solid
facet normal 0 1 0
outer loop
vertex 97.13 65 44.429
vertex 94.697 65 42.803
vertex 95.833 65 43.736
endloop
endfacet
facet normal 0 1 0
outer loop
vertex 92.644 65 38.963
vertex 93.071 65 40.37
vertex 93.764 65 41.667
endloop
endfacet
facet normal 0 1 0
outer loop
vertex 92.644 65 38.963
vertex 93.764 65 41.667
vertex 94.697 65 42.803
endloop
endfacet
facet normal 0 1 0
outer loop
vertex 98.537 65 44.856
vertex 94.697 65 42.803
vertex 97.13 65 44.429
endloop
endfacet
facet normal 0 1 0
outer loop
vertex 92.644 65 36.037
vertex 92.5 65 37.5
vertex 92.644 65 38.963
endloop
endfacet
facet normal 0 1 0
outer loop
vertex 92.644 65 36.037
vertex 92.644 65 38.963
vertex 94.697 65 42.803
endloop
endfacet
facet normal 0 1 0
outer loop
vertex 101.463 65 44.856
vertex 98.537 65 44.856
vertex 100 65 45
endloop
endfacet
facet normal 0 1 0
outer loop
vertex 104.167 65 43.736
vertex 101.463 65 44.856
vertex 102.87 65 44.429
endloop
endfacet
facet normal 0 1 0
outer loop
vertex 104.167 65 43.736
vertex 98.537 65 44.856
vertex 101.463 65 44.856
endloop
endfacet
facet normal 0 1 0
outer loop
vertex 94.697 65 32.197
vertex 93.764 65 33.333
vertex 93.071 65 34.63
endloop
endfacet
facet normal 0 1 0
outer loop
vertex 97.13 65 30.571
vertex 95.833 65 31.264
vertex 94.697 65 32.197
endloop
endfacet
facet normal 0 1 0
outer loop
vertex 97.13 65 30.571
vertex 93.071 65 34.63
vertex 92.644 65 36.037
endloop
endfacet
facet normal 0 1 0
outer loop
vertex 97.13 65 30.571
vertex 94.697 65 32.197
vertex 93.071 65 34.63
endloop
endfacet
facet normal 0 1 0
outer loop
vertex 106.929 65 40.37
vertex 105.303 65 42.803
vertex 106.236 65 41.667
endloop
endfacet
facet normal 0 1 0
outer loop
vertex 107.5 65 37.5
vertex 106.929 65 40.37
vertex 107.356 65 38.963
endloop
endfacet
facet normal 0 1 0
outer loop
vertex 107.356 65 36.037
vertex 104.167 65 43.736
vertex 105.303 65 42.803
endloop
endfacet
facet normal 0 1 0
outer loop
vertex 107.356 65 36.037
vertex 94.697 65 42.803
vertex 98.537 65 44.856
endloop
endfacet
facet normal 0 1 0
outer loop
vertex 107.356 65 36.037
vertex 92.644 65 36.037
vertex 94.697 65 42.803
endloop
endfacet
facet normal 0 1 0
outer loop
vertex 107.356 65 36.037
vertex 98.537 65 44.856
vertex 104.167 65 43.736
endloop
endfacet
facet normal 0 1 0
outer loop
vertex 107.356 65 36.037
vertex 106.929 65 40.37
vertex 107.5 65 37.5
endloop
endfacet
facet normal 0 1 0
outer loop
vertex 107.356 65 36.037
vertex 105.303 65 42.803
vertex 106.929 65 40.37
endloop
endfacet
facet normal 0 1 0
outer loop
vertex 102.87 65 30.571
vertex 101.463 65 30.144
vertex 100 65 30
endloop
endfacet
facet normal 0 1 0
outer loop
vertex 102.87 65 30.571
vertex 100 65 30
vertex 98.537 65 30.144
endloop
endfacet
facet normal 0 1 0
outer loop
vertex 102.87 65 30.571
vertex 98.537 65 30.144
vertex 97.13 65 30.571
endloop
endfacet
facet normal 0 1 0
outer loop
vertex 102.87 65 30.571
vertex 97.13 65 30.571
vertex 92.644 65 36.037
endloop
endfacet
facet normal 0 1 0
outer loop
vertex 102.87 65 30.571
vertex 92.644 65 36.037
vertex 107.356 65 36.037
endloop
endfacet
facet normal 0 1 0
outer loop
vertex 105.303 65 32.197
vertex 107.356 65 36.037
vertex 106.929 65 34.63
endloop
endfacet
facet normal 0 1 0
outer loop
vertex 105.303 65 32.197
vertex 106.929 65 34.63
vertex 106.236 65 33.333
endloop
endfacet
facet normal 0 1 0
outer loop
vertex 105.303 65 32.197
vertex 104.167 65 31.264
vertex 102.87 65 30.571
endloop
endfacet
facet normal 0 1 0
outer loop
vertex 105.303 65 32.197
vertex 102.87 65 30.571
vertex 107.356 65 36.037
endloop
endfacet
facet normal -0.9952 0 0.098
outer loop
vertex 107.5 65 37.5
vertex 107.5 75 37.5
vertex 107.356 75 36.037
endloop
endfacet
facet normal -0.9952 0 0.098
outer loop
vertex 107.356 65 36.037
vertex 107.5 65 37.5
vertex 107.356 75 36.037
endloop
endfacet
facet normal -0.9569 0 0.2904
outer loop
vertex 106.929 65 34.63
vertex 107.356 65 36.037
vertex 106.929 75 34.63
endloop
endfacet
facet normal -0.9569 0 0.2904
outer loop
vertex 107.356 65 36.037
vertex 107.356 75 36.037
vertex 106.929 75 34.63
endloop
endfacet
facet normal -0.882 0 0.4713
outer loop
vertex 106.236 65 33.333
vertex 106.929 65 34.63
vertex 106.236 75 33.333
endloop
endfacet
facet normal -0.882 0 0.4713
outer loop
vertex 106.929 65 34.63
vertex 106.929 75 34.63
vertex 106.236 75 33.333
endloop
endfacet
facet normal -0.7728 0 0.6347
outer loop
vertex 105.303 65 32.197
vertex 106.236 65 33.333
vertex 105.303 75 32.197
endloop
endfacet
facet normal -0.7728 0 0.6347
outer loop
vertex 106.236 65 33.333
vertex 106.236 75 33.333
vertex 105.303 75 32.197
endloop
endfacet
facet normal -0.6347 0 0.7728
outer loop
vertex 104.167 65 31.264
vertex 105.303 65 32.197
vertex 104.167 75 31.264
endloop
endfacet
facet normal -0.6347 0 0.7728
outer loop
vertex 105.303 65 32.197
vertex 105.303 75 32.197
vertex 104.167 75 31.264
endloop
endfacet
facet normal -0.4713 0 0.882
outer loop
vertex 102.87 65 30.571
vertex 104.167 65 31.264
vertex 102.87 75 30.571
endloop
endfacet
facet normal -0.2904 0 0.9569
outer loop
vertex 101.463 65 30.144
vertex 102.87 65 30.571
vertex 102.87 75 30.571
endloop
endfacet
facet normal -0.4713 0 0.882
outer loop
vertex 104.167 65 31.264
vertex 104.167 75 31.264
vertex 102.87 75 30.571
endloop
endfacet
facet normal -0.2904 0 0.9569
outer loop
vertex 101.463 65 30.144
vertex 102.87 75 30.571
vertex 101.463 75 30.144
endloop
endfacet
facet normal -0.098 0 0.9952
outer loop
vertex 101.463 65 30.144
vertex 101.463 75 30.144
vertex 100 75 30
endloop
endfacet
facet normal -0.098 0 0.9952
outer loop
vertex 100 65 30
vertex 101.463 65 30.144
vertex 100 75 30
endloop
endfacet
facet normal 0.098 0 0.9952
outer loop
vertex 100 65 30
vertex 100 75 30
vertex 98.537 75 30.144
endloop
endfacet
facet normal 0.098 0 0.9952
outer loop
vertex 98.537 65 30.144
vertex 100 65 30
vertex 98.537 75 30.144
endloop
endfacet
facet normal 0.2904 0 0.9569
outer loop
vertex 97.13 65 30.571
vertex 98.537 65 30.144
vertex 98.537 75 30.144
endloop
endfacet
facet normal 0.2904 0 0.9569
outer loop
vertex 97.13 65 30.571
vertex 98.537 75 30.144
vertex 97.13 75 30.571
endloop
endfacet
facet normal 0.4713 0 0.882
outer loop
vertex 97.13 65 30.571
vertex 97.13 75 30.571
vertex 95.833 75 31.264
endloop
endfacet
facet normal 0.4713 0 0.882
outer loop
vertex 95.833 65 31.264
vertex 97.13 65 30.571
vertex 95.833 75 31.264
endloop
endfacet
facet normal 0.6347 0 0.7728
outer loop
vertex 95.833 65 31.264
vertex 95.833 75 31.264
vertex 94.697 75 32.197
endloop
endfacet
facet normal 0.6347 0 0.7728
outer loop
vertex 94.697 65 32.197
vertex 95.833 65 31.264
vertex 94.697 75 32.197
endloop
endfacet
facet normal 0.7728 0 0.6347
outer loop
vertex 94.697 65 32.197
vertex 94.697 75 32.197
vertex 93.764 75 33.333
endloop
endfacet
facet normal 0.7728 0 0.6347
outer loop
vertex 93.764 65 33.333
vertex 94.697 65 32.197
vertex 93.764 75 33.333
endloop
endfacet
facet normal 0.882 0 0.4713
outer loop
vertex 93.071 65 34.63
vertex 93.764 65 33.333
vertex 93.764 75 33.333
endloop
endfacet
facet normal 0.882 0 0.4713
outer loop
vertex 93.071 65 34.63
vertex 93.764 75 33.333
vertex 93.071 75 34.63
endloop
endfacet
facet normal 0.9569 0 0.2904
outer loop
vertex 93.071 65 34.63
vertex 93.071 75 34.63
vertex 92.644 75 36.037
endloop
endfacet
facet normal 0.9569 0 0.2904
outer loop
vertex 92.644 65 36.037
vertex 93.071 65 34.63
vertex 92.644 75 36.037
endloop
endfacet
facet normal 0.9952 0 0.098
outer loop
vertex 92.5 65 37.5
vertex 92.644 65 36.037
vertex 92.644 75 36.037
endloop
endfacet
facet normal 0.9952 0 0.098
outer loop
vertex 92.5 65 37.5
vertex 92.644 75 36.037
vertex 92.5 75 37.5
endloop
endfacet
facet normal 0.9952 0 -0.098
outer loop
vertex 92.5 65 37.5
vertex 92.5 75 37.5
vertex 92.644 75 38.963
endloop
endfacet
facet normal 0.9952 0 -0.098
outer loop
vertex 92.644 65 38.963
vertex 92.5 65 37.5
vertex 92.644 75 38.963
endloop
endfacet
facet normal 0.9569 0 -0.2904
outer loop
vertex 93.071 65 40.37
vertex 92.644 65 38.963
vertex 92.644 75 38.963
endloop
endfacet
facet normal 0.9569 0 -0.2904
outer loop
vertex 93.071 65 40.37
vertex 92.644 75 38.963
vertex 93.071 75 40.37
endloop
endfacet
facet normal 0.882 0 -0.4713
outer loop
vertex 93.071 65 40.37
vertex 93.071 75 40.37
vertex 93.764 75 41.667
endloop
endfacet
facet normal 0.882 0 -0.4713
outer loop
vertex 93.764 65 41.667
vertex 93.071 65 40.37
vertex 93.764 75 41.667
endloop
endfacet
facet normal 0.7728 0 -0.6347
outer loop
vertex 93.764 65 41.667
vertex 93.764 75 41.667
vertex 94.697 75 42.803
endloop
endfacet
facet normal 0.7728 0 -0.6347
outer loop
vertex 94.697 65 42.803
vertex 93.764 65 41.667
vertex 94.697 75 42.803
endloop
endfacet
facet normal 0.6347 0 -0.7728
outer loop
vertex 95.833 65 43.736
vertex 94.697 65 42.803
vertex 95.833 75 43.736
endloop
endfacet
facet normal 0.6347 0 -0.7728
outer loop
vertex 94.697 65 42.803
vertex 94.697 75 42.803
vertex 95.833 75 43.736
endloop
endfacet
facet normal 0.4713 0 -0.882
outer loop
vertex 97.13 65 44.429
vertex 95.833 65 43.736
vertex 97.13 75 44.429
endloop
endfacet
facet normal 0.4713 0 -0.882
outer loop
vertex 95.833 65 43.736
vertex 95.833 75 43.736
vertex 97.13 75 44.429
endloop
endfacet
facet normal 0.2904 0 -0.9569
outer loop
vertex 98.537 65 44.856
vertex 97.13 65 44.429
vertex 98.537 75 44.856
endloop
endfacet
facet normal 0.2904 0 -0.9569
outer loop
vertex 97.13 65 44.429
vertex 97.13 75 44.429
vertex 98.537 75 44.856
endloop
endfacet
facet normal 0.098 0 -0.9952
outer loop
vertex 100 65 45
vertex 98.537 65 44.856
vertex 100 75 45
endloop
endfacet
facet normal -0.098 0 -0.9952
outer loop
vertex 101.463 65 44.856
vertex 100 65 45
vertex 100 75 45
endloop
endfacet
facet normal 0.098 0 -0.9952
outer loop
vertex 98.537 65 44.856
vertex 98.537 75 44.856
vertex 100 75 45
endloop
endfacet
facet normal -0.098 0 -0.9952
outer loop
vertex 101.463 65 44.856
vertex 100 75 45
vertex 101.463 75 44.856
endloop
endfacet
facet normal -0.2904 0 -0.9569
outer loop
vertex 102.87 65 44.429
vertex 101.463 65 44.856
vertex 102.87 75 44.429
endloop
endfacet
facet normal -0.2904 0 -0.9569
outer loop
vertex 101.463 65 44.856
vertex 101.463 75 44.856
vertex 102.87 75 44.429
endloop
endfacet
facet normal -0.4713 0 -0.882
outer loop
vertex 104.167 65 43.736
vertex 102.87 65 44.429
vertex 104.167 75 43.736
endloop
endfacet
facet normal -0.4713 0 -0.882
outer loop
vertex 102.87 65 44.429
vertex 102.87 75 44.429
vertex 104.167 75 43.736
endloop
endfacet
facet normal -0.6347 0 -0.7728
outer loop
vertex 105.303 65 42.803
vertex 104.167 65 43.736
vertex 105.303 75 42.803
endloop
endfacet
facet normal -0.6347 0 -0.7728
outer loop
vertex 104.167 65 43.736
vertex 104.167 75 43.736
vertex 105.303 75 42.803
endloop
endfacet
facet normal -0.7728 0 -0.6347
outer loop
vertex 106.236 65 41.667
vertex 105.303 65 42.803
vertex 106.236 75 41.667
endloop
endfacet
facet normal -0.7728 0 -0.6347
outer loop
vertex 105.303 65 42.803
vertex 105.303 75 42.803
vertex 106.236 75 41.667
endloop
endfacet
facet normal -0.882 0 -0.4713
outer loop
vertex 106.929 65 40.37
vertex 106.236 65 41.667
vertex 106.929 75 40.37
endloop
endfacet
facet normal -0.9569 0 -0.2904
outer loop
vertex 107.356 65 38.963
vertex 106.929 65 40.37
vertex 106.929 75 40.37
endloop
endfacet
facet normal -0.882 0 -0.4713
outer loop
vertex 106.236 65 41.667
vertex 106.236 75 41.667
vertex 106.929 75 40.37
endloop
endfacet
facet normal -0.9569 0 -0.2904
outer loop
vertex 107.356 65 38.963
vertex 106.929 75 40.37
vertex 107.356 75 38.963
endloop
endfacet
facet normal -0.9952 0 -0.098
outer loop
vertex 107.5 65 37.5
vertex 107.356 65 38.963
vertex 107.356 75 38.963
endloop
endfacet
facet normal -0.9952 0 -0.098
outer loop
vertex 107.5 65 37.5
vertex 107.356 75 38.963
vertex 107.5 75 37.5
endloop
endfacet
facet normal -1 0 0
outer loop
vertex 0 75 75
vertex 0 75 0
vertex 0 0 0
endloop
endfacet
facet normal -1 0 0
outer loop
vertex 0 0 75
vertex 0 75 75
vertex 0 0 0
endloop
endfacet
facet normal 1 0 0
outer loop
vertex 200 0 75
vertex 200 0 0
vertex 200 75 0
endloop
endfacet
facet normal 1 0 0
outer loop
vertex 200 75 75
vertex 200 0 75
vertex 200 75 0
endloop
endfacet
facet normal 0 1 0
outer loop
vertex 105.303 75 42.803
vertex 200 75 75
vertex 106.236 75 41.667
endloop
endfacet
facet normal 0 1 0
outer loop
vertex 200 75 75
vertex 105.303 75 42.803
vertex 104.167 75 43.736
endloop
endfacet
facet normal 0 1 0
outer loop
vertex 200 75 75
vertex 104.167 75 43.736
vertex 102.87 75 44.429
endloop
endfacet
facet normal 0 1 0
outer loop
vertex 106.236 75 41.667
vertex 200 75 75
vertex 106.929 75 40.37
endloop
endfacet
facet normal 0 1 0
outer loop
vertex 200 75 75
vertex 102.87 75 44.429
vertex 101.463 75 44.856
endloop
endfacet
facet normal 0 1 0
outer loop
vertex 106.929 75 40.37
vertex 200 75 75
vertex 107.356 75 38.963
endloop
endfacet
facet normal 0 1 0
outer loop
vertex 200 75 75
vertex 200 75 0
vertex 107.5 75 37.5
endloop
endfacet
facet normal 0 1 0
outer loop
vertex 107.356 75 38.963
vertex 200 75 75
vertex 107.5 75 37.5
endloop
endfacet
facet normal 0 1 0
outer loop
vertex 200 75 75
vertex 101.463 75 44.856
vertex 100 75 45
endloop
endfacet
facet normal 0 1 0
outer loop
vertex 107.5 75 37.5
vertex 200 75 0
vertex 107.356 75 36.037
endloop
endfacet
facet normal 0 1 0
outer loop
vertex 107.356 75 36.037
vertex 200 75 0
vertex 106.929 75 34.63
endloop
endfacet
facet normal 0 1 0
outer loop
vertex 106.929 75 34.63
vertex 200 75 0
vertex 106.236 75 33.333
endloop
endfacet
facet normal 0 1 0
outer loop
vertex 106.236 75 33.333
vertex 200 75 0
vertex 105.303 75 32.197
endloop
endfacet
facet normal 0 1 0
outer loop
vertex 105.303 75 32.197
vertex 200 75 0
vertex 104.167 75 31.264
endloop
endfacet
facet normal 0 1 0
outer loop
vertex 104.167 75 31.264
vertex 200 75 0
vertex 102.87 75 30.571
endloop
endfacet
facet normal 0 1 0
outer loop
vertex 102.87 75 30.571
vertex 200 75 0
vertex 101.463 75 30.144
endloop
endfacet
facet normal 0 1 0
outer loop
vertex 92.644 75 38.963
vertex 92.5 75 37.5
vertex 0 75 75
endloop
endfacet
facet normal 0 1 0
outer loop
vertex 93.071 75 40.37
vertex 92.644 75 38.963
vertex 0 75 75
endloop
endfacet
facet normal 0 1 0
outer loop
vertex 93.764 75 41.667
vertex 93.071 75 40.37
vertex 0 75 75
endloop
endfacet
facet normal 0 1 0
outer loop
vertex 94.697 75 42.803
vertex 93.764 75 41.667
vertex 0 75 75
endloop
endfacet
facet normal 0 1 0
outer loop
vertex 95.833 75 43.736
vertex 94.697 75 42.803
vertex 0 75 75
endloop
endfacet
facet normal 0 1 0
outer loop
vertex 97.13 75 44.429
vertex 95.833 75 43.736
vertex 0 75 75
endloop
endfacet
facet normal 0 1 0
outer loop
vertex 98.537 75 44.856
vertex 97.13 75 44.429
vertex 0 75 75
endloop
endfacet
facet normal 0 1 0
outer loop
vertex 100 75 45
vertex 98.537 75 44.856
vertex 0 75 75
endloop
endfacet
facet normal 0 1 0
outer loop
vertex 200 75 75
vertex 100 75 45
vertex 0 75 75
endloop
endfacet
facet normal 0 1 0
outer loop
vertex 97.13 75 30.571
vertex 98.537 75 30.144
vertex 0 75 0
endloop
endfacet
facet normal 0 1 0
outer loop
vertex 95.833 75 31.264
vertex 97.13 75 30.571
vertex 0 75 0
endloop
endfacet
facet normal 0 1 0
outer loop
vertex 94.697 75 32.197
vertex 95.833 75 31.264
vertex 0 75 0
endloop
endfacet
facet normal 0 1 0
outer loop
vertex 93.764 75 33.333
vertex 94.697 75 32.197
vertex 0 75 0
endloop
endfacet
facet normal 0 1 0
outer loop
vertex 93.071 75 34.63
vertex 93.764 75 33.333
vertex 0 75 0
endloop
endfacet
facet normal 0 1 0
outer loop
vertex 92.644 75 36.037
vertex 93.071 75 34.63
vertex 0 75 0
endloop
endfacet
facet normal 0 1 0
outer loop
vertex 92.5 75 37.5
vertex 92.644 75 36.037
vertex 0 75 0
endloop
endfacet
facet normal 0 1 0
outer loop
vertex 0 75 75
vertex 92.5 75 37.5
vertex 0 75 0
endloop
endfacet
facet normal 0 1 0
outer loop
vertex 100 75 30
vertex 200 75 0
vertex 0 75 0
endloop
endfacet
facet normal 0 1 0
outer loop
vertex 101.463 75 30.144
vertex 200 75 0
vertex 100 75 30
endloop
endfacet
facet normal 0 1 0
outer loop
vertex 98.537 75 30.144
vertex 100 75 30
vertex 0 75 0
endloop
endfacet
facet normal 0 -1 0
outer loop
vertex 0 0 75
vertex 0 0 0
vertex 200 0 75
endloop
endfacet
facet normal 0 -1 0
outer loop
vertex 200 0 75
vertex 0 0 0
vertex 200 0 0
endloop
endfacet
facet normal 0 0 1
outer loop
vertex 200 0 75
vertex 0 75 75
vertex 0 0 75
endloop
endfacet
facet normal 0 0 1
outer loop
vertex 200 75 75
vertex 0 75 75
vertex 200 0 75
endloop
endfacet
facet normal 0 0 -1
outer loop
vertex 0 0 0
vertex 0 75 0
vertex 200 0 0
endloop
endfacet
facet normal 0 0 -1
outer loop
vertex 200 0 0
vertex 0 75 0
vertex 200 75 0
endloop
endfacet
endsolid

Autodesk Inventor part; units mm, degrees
ref_plane "YZ Plane" through (0, 0, 0) normal (1, 0, 0) x (0, 1, 0)
ref_plane "XZ Plane" through (0, 0, 0) normal (0, 1, 0) x (-1, 0, 0)
ref_plane "XY Plane" through (0, 0, 0) normal (0, 0, 1) x (1, 0, 0)
sketch "Sketch1" plane through (0, 0, 0) normal (0, 0, 1) x (1, 0, 0)
  line L0 (0, 0) -> (200, 0)
  line L1 (200, 0) -> (200, 75)
  line L2 (200, 75) -> (0, 75)
  line L3 (0, 75) -> (0, 0)
  dimension "d0" = 200
  dimension "d1" = 75
extrude "Extrusion1" add sketch "Sketch1" along normal blind 75
sketch "Sketch2" plane through (0, 75, 0) normal (0, 1, 0) x (1, 0, 0)
  circle A0 centre (100, -37.5) radius 7.5
  point P0 (0, 0)
  dimension "d4" = 15
extrude "Extrusion2" cut sketch "Sketch2" against normal blind 10
properties part number "End-Effector"
